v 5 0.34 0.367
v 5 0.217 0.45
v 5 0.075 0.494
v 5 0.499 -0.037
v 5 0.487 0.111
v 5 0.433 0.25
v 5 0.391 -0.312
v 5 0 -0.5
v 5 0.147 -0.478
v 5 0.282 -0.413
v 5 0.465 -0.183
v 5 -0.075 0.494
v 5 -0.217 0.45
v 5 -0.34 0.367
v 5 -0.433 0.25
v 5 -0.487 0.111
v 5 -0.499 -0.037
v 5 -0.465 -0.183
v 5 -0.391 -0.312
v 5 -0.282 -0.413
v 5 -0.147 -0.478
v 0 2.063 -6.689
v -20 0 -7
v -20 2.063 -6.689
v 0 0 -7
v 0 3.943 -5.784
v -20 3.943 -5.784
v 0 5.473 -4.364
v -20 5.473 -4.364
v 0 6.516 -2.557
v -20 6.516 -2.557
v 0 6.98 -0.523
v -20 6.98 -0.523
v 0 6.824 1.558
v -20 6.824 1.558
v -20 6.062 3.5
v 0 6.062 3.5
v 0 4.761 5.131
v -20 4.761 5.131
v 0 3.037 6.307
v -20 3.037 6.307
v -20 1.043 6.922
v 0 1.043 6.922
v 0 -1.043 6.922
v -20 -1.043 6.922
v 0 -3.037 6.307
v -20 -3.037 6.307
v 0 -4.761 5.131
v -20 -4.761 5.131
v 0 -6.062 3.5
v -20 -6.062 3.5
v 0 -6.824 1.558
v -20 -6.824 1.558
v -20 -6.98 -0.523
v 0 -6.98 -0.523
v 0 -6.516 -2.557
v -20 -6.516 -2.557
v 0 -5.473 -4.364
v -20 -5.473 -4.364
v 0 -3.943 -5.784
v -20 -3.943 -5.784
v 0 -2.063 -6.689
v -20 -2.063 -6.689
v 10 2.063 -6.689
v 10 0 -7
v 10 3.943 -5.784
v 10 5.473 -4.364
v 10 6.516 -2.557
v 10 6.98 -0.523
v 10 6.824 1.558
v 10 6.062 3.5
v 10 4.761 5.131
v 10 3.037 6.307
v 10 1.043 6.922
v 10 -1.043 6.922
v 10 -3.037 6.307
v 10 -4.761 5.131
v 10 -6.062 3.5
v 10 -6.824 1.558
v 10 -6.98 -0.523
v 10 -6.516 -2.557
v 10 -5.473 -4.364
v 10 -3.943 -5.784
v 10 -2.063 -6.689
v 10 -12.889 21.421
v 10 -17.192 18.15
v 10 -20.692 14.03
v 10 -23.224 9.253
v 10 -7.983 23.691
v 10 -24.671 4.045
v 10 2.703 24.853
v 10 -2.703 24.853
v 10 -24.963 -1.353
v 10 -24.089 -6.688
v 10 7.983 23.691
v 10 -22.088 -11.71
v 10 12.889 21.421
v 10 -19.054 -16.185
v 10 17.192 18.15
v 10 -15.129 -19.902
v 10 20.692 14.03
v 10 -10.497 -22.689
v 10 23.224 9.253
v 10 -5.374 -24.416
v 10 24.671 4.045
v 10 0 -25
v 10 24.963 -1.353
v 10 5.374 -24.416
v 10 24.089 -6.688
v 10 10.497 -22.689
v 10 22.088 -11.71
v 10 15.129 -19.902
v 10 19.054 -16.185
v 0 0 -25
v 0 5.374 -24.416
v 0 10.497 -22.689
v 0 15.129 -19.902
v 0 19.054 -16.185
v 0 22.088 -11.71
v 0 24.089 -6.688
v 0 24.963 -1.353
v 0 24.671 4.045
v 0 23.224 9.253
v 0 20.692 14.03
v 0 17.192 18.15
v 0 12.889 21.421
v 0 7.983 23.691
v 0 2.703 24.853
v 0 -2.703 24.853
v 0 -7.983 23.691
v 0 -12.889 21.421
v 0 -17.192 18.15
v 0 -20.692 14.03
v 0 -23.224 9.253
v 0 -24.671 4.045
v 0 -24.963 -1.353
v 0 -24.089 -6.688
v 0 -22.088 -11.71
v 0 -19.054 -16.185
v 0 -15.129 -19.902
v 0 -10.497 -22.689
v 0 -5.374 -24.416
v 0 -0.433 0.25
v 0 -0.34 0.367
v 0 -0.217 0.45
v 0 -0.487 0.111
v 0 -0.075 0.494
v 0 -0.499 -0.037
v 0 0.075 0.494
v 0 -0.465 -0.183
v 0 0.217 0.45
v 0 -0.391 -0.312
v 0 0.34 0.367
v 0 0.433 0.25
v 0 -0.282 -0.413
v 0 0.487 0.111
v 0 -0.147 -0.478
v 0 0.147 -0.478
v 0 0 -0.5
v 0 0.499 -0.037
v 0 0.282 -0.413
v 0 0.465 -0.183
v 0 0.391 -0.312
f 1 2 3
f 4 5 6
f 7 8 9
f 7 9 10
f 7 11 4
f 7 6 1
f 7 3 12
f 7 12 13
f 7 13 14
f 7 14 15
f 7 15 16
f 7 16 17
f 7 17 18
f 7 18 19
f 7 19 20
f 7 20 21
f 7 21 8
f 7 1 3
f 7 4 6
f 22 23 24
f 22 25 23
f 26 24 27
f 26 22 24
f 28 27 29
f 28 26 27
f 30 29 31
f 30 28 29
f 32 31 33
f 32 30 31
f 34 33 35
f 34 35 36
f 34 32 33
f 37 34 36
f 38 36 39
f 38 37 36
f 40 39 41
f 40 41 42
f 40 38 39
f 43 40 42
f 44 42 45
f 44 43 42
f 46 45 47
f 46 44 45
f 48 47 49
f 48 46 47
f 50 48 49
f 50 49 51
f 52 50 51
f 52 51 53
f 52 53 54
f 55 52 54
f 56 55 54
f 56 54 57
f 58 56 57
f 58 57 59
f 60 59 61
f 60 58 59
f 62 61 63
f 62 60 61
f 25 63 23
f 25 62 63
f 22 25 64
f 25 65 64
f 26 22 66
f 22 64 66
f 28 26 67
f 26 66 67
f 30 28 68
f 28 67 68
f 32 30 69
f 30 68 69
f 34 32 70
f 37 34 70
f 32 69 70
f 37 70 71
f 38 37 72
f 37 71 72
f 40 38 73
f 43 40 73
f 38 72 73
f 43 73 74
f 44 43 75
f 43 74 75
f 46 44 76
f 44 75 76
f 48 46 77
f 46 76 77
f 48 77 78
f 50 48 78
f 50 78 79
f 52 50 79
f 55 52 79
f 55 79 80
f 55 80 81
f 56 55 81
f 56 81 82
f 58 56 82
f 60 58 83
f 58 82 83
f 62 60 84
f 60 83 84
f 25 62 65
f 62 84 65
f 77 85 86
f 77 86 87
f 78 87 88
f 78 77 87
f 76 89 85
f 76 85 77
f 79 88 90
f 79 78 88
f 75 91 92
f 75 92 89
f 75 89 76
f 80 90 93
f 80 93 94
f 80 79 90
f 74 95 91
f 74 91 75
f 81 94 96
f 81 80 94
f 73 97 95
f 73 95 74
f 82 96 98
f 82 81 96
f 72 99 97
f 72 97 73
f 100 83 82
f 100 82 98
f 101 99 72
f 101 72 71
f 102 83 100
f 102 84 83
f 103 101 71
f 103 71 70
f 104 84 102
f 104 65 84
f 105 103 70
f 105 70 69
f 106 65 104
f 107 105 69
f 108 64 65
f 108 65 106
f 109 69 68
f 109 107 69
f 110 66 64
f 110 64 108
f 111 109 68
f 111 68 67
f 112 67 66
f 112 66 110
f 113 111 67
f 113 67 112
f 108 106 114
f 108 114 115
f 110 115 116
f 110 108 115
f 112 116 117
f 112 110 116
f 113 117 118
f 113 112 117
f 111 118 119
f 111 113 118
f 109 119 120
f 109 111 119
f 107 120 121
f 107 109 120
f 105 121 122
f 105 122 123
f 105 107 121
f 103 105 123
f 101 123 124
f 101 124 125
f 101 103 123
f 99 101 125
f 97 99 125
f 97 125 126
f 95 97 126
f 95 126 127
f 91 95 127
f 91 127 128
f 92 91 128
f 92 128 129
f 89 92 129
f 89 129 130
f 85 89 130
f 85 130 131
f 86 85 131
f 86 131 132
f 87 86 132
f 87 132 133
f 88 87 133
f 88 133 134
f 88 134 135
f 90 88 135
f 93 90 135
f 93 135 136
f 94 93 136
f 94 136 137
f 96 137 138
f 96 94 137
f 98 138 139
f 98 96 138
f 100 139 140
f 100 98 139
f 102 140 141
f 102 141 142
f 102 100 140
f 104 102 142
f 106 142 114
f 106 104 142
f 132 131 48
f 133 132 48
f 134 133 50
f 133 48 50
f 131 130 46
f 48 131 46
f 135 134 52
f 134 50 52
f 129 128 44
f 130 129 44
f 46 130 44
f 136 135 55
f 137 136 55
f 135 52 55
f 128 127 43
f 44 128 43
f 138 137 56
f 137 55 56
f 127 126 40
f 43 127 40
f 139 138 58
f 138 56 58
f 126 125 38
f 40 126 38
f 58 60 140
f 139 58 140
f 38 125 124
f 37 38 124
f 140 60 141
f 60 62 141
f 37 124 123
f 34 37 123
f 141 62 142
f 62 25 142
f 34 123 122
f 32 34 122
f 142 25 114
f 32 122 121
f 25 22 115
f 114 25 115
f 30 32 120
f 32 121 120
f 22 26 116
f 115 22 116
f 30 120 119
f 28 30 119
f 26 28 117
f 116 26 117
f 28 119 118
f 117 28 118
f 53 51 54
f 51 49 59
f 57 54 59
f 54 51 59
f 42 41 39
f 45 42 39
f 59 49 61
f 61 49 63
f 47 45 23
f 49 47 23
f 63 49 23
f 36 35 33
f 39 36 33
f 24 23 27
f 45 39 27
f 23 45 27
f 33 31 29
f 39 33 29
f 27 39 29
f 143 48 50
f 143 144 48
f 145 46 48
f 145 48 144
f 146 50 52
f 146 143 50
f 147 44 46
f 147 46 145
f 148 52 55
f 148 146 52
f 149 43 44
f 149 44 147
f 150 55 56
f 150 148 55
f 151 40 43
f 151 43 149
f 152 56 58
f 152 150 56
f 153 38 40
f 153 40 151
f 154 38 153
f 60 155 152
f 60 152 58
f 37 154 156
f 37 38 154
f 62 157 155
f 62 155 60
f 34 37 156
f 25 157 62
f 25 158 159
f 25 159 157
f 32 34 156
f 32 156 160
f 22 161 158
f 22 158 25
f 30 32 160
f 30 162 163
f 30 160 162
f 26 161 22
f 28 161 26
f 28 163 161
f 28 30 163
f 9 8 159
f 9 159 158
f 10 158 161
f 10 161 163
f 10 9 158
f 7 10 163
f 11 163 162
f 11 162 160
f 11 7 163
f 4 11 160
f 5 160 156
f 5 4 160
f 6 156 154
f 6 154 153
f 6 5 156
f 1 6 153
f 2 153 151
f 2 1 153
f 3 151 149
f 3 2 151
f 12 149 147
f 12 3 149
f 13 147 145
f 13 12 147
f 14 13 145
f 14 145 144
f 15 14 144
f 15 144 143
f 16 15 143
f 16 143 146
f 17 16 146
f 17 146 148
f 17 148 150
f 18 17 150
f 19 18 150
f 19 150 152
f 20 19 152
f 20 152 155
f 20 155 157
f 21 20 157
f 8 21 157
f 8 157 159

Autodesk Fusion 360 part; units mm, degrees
cylinder "CylinderPrimitive1" add diameter 50 height 10 placed x (0, 0, -1) y (0, 1, 0) z (1, 0, 0) at (0, 0, 0) makes body 1
sketch "Sketch2" plane through (0, 0, 0) normal (1, 0, 0) x (0, 1, 0)
cylinder "CylinderPrimitive2" cut diameter 14 height 10 placed x (0, 0, -1) y (0, 1, 0) z (1, 0, 0) at (0, 0, 0) bodies 1
cylinder "CylinderPrimitive3" add diameter 14 height -20 placed x (0, 0, -1) y (0, 1, 0) z (1, 0, 0) at (0, 0, 0) separate body makes body 2
cylinder "CylinderPrimitive4" add diameter 1 height 5 placed x (0, 0, -1) y (0, 1, 0) z (1, 0, 0) at (0, 0, 0) bodies 2
